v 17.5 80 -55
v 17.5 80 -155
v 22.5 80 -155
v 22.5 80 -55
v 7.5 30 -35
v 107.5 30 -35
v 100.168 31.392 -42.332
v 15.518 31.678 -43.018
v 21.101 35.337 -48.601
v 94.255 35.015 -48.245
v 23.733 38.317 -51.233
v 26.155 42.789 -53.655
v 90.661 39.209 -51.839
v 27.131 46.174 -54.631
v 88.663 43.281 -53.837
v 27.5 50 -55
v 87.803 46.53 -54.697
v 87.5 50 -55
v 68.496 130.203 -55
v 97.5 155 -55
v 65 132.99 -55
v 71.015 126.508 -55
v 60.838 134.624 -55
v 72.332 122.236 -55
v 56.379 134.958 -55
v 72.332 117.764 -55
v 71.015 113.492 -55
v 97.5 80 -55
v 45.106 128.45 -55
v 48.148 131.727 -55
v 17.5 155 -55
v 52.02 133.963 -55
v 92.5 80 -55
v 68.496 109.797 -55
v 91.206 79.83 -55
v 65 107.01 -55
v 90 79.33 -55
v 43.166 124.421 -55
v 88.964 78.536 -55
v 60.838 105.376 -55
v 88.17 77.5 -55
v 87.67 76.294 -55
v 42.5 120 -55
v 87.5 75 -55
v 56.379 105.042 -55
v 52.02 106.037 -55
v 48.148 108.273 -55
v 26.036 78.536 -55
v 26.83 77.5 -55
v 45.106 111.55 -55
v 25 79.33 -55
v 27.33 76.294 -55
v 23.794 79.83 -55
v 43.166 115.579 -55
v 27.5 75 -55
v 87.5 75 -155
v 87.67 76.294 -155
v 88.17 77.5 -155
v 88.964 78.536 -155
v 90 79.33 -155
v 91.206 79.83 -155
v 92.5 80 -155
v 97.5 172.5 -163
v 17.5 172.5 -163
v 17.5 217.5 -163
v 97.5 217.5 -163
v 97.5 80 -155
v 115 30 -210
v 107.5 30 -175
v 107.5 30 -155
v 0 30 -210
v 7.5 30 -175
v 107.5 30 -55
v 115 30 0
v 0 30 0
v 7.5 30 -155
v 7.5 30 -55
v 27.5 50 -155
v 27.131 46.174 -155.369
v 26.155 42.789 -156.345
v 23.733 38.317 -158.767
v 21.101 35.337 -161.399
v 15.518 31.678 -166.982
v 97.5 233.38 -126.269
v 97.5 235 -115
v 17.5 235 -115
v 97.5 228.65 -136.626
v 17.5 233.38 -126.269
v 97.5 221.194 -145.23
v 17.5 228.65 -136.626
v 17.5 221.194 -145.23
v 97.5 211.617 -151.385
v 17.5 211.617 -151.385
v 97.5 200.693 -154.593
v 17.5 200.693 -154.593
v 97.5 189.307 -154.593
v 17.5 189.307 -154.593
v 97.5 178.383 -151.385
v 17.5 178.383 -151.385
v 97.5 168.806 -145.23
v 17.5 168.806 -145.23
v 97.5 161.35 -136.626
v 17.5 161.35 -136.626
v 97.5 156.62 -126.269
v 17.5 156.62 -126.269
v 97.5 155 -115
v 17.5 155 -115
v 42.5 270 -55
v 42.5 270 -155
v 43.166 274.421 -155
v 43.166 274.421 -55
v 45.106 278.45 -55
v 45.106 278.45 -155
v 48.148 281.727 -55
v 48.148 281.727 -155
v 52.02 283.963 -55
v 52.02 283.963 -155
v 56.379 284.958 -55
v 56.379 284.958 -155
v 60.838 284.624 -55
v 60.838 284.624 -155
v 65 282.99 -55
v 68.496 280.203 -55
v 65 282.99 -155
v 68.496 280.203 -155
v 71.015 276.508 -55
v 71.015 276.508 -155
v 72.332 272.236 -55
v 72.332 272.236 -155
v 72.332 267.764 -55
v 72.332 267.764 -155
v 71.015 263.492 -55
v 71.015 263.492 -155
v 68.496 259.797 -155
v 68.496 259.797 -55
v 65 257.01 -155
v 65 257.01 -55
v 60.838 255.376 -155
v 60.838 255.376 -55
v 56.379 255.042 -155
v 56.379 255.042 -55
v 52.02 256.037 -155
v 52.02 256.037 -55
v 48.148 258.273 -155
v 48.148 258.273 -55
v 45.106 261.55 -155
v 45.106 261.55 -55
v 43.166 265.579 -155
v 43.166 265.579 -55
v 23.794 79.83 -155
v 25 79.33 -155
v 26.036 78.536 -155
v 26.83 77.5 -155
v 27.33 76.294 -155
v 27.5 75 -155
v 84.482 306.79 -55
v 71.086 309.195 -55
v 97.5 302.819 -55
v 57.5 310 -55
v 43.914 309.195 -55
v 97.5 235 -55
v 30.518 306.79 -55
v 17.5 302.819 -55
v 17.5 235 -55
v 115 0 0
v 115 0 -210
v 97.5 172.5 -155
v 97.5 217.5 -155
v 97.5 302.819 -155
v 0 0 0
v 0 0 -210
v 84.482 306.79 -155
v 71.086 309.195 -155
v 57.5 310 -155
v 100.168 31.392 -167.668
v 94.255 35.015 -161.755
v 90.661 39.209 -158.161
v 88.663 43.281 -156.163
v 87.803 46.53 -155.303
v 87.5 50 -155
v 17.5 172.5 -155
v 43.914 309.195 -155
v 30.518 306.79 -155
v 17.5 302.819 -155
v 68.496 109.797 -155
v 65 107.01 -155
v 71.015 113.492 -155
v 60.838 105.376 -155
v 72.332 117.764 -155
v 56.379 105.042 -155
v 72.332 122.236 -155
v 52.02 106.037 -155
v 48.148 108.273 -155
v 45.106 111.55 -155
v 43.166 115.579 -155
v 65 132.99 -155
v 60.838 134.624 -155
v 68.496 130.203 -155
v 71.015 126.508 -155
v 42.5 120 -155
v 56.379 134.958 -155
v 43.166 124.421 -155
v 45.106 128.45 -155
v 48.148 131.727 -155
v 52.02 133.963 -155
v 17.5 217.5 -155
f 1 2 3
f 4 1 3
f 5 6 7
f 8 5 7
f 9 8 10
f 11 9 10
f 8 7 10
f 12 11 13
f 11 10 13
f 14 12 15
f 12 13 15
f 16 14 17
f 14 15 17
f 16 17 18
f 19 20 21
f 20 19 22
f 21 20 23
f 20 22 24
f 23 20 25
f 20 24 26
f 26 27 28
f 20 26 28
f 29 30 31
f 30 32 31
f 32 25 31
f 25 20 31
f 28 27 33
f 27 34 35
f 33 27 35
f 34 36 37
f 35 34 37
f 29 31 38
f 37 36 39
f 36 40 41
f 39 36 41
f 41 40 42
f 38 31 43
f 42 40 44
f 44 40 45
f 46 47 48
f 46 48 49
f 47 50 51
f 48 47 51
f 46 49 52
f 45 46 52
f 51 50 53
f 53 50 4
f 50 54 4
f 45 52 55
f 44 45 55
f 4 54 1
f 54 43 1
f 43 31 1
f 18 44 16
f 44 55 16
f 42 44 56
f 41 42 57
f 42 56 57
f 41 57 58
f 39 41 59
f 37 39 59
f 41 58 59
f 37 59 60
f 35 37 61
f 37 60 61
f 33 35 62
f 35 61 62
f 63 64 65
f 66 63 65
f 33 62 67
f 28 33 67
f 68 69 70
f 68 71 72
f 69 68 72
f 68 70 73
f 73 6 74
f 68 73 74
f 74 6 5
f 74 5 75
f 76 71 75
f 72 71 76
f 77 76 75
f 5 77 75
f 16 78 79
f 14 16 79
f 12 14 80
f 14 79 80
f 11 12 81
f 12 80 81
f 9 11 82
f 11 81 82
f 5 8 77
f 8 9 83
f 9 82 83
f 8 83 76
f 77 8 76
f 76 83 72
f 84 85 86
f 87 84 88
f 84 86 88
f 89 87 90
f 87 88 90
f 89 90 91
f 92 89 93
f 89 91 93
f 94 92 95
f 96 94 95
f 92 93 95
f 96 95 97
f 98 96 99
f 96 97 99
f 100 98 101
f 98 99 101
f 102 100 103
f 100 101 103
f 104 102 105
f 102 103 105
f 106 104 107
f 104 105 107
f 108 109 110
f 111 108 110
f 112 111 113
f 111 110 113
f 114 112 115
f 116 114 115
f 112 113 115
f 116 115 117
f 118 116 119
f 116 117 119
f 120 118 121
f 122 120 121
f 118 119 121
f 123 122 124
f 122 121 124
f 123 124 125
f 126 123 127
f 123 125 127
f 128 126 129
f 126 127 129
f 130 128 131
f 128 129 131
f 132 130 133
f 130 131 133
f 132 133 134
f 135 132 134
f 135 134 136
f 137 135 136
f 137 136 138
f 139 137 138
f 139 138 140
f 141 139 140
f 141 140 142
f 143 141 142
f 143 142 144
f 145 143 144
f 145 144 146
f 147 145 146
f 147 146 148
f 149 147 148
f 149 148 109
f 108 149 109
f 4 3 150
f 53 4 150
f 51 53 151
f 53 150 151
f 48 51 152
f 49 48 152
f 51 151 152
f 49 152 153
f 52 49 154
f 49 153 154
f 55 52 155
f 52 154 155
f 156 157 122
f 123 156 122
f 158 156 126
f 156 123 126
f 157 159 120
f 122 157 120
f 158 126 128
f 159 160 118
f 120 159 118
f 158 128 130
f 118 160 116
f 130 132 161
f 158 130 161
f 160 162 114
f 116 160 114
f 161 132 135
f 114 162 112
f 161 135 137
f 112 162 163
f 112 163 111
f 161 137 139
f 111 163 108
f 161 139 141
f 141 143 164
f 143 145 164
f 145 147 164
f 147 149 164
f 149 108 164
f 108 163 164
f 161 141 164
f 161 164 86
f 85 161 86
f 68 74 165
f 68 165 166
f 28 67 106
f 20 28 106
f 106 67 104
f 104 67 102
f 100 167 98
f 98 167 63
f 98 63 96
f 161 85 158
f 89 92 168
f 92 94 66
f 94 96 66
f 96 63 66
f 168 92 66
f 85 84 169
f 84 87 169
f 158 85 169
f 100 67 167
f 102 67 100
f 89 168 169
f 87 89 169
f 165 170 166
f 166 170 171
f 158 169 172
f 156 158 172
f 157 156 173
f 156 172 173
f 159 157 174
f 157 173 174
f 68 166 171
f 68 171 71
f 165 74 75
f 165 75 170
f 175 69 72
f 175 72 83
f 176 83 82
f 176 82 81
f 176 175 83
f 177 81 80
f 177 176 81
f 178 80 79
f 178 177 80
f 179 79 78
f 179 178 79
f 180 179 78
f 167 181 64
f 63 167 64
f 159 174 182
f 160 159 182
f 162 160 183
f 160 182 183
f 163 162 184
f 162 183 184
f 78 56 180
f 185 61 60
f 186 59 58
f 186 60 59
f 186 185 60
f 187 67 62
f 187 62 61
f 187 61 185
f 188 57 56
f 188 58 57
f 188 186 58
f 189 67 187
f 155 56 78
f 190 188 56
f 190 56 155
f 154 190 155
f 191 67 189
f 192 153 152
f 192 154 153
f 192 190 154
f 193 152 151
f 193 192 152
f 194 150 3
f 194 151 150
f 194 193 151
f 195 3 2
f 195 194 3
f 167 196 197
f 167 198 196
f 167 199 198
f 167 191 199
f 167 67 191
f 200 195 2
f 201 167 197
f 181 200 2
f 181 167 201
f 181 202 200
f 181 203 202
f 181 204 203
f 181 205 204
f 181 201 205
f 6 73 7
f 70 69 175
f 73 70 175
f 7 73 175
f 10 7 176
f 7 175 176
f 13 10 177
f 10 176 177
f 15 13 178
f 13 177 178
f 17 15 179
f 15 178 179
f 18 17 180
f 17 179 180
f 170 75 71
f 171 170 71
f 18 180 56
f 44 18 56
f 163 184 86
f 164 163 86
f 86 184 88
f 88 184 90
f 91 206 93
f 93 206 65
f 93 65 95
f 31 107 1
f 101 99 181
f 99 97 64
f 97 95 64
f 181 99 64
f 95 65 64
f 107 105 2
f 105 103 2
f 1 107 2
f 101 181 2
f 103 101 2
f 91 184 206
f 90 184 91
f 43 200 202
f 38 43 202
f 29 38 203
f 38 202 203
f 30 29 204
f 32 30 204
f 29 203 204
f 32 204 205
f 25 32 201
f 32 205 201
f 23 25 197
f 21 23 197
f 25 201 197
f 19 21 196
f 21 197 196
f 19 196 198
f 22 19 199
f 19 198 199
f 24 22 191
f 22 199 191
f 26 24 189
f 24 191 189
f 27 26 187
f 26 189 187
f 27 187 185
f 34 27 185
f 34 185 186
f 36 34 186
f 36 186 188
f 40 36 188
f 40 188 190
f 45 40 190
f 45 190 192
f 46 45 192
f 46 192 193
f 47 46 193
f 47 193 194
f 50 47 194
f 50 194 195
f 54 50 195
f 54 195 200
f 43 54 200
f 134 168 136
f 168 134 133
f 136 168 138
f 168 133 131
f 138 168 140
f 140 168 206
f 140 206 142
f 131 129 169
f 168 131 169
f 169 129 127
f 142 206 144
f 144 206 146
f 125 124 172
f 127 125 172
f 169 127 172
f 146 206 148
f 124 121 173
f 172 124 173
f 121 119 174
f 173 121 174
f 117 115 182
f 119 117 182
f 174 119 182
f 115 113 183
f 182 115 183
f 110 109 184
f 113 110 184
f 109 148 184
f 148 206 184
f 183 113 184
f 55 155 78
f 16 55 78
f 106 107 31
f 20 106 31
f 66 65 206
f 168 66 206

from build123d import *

# Parameters (mm, degrees)
BOSS_EXTRUDE1_DEPTH     = 115
CUT_EXTRUDE4_DEPTH      = 56
CUT_EXTRUDE4_DEPTH_BACK = 156
FILLET1_R               = 20
SKETCH4_R               = 15
CUT_EXTRUDE5_DEPTH      = 56
CUT_EXTRUDE5_DEPTH_BACK = 148


with BuildPart() as part:
    # Sketch1 → Boss-Extrude1 (new body)
    with BuildSketch(Plane(origin=(0, 0, 0), x_dir=(0, 0, -1), z_dir=(1, 0, 0))):
        with BuildLine():
            Line((0, 0), (210, 0))
            Line((210, 0), (210, 30))
            Line((210, 30), (155, 30))
            Line((155, 30), (155, 172.5))
            Line((155, 172.5), (163, 172.5))
            Line((163, 172.5), (163, 217.5))
            Line((163, 217.5), (155, 217.5))
            Line((155, 217.5), (155, 310))
            Line((155, 310), (55, 310))
            Line((55, 310), (55, 235))
            Line((55, 235), (115, 235))
            ThreePointArc((115, 235), (155, 195), (115, 155))
            Line((115, 155), (55, 155))
            Line((55, 155), (55, 30))
            Line((55, 30), (0, 30))
            Line((0, 30), (0, 0))
        make_face()
    extrude(amount=BOSS_EXTRUDE1_DEPTH)

    # Sketch2 → Cut-Extrude4 (cut, two sides)
    with BuildSketch(Plane(origin=(0, 0, -155), x_dir=(-1, 0, 0), z_dir=(0, 0, -1))) as cut_extrude4_sk:
        with BuildLine():
            Line((0, 172.5), (-17.5, 172.5))
            Line((-17.5, 172.5), (-17.5, 80))
            Line((-17.5, 80), (-22.5, 80))
            ThreePointArc((-22.5, 80), (-26.035533906, 78.535533906), (-27.5, 75))
            Line((-27.5, 75), (-27.5, 50))
            ThreePointArc((-27.5, 50), (-21.642135624, 35.857864376), (-7.5, 30))
            Line((-7.5, 30), (0, 30))
            Line((0, 30), (0, 172.5))
        make_face()
        with BuildLine():
            Line((-97.5, 172.5), (-97.5, 302.819293264))
            ThreePointArc((-97.5, 302.819293264), (-77.819710562, 308.190588667), (-57.5, 310))
            Line((-57.5, 310), (-115, 310))
            Line((-115, 310), (-115, 172.5))
            Line((-115, 172.5), (-97.5, 172.5))
        make_face()
        with BuildLine():
            Line((-97.5, 80), (-97.5, 172.5))
            Line((-97.5, 172.5), (-115, 172.5))
            Line((-115, 172.5), (-115, 30))
            Line((-115, 30), (-107.5, 30))
            ThreePointArc((-107.5, 30), (-93.357864376, 35.857864376), (-87.5, 50))
            Line((-87.5, 50), (-87.5, 75))
            ThreePointArc((-87.5, 75), (-88.964466094, 78.535533906), (-92.5, 80))
            Line((-92.5, 80), (-97.5, 80))
        make_face()
        with BuildLine():
            Line((0, 310), (-57.5, 310))
            ThreePointArc((-57.5, 310), (-37.180289438, 308.190588667), (-17.5, 302.819293264))
            Line((-17.5, 302.819293264), (-17.5, 172.5))
            Line((-17.5, 172.5), (0, 172.5))
            Line((0, 172.5), (0, 310))
        make_face()
    extrude(amount=CUT_EXTRUDE4_DEPTH, mode=Mode.SUBTRACT)
    extrude(cut_extrude4_sk.sketch, amount=-CUT_EXTRUDE4_DEPTH_BACK, mode=Mode.SUBTRACT)

    # Fillet1
    fillet1_edges = [part.edges().sort_by_distance(p)[0] for p in [
        (57.5, 30, -155),
        (57.5, 30, -55),
    ]]
    fillet(fillet1_edges, radius=FILLET1_R)

    # Sketch4 → Cut-Extrude5 (cut, two sides)
    with BuildSketch(Plane(origin=(0, 0, -155), x_dir=(-1, 0, 0), z_dir=(0, 0, -1))) as cut_extrude5_sk:
        with Locations((-57.5, 120)):
            Circle(SKETCH4_R)
        with Locations((-57.5, 270)):
            Circle(SKETCH4_R)
    extrude(amount=CUT_EXTRUDE5_DEPTH, mode=Mode.SUBTRACT)
    extrude(cut_extrude5_sk.sketch, amount=-CUT_EXTRUDE5_DEPTH_BACK, mode=Mode.SUBTRACT)


solid = part.part
